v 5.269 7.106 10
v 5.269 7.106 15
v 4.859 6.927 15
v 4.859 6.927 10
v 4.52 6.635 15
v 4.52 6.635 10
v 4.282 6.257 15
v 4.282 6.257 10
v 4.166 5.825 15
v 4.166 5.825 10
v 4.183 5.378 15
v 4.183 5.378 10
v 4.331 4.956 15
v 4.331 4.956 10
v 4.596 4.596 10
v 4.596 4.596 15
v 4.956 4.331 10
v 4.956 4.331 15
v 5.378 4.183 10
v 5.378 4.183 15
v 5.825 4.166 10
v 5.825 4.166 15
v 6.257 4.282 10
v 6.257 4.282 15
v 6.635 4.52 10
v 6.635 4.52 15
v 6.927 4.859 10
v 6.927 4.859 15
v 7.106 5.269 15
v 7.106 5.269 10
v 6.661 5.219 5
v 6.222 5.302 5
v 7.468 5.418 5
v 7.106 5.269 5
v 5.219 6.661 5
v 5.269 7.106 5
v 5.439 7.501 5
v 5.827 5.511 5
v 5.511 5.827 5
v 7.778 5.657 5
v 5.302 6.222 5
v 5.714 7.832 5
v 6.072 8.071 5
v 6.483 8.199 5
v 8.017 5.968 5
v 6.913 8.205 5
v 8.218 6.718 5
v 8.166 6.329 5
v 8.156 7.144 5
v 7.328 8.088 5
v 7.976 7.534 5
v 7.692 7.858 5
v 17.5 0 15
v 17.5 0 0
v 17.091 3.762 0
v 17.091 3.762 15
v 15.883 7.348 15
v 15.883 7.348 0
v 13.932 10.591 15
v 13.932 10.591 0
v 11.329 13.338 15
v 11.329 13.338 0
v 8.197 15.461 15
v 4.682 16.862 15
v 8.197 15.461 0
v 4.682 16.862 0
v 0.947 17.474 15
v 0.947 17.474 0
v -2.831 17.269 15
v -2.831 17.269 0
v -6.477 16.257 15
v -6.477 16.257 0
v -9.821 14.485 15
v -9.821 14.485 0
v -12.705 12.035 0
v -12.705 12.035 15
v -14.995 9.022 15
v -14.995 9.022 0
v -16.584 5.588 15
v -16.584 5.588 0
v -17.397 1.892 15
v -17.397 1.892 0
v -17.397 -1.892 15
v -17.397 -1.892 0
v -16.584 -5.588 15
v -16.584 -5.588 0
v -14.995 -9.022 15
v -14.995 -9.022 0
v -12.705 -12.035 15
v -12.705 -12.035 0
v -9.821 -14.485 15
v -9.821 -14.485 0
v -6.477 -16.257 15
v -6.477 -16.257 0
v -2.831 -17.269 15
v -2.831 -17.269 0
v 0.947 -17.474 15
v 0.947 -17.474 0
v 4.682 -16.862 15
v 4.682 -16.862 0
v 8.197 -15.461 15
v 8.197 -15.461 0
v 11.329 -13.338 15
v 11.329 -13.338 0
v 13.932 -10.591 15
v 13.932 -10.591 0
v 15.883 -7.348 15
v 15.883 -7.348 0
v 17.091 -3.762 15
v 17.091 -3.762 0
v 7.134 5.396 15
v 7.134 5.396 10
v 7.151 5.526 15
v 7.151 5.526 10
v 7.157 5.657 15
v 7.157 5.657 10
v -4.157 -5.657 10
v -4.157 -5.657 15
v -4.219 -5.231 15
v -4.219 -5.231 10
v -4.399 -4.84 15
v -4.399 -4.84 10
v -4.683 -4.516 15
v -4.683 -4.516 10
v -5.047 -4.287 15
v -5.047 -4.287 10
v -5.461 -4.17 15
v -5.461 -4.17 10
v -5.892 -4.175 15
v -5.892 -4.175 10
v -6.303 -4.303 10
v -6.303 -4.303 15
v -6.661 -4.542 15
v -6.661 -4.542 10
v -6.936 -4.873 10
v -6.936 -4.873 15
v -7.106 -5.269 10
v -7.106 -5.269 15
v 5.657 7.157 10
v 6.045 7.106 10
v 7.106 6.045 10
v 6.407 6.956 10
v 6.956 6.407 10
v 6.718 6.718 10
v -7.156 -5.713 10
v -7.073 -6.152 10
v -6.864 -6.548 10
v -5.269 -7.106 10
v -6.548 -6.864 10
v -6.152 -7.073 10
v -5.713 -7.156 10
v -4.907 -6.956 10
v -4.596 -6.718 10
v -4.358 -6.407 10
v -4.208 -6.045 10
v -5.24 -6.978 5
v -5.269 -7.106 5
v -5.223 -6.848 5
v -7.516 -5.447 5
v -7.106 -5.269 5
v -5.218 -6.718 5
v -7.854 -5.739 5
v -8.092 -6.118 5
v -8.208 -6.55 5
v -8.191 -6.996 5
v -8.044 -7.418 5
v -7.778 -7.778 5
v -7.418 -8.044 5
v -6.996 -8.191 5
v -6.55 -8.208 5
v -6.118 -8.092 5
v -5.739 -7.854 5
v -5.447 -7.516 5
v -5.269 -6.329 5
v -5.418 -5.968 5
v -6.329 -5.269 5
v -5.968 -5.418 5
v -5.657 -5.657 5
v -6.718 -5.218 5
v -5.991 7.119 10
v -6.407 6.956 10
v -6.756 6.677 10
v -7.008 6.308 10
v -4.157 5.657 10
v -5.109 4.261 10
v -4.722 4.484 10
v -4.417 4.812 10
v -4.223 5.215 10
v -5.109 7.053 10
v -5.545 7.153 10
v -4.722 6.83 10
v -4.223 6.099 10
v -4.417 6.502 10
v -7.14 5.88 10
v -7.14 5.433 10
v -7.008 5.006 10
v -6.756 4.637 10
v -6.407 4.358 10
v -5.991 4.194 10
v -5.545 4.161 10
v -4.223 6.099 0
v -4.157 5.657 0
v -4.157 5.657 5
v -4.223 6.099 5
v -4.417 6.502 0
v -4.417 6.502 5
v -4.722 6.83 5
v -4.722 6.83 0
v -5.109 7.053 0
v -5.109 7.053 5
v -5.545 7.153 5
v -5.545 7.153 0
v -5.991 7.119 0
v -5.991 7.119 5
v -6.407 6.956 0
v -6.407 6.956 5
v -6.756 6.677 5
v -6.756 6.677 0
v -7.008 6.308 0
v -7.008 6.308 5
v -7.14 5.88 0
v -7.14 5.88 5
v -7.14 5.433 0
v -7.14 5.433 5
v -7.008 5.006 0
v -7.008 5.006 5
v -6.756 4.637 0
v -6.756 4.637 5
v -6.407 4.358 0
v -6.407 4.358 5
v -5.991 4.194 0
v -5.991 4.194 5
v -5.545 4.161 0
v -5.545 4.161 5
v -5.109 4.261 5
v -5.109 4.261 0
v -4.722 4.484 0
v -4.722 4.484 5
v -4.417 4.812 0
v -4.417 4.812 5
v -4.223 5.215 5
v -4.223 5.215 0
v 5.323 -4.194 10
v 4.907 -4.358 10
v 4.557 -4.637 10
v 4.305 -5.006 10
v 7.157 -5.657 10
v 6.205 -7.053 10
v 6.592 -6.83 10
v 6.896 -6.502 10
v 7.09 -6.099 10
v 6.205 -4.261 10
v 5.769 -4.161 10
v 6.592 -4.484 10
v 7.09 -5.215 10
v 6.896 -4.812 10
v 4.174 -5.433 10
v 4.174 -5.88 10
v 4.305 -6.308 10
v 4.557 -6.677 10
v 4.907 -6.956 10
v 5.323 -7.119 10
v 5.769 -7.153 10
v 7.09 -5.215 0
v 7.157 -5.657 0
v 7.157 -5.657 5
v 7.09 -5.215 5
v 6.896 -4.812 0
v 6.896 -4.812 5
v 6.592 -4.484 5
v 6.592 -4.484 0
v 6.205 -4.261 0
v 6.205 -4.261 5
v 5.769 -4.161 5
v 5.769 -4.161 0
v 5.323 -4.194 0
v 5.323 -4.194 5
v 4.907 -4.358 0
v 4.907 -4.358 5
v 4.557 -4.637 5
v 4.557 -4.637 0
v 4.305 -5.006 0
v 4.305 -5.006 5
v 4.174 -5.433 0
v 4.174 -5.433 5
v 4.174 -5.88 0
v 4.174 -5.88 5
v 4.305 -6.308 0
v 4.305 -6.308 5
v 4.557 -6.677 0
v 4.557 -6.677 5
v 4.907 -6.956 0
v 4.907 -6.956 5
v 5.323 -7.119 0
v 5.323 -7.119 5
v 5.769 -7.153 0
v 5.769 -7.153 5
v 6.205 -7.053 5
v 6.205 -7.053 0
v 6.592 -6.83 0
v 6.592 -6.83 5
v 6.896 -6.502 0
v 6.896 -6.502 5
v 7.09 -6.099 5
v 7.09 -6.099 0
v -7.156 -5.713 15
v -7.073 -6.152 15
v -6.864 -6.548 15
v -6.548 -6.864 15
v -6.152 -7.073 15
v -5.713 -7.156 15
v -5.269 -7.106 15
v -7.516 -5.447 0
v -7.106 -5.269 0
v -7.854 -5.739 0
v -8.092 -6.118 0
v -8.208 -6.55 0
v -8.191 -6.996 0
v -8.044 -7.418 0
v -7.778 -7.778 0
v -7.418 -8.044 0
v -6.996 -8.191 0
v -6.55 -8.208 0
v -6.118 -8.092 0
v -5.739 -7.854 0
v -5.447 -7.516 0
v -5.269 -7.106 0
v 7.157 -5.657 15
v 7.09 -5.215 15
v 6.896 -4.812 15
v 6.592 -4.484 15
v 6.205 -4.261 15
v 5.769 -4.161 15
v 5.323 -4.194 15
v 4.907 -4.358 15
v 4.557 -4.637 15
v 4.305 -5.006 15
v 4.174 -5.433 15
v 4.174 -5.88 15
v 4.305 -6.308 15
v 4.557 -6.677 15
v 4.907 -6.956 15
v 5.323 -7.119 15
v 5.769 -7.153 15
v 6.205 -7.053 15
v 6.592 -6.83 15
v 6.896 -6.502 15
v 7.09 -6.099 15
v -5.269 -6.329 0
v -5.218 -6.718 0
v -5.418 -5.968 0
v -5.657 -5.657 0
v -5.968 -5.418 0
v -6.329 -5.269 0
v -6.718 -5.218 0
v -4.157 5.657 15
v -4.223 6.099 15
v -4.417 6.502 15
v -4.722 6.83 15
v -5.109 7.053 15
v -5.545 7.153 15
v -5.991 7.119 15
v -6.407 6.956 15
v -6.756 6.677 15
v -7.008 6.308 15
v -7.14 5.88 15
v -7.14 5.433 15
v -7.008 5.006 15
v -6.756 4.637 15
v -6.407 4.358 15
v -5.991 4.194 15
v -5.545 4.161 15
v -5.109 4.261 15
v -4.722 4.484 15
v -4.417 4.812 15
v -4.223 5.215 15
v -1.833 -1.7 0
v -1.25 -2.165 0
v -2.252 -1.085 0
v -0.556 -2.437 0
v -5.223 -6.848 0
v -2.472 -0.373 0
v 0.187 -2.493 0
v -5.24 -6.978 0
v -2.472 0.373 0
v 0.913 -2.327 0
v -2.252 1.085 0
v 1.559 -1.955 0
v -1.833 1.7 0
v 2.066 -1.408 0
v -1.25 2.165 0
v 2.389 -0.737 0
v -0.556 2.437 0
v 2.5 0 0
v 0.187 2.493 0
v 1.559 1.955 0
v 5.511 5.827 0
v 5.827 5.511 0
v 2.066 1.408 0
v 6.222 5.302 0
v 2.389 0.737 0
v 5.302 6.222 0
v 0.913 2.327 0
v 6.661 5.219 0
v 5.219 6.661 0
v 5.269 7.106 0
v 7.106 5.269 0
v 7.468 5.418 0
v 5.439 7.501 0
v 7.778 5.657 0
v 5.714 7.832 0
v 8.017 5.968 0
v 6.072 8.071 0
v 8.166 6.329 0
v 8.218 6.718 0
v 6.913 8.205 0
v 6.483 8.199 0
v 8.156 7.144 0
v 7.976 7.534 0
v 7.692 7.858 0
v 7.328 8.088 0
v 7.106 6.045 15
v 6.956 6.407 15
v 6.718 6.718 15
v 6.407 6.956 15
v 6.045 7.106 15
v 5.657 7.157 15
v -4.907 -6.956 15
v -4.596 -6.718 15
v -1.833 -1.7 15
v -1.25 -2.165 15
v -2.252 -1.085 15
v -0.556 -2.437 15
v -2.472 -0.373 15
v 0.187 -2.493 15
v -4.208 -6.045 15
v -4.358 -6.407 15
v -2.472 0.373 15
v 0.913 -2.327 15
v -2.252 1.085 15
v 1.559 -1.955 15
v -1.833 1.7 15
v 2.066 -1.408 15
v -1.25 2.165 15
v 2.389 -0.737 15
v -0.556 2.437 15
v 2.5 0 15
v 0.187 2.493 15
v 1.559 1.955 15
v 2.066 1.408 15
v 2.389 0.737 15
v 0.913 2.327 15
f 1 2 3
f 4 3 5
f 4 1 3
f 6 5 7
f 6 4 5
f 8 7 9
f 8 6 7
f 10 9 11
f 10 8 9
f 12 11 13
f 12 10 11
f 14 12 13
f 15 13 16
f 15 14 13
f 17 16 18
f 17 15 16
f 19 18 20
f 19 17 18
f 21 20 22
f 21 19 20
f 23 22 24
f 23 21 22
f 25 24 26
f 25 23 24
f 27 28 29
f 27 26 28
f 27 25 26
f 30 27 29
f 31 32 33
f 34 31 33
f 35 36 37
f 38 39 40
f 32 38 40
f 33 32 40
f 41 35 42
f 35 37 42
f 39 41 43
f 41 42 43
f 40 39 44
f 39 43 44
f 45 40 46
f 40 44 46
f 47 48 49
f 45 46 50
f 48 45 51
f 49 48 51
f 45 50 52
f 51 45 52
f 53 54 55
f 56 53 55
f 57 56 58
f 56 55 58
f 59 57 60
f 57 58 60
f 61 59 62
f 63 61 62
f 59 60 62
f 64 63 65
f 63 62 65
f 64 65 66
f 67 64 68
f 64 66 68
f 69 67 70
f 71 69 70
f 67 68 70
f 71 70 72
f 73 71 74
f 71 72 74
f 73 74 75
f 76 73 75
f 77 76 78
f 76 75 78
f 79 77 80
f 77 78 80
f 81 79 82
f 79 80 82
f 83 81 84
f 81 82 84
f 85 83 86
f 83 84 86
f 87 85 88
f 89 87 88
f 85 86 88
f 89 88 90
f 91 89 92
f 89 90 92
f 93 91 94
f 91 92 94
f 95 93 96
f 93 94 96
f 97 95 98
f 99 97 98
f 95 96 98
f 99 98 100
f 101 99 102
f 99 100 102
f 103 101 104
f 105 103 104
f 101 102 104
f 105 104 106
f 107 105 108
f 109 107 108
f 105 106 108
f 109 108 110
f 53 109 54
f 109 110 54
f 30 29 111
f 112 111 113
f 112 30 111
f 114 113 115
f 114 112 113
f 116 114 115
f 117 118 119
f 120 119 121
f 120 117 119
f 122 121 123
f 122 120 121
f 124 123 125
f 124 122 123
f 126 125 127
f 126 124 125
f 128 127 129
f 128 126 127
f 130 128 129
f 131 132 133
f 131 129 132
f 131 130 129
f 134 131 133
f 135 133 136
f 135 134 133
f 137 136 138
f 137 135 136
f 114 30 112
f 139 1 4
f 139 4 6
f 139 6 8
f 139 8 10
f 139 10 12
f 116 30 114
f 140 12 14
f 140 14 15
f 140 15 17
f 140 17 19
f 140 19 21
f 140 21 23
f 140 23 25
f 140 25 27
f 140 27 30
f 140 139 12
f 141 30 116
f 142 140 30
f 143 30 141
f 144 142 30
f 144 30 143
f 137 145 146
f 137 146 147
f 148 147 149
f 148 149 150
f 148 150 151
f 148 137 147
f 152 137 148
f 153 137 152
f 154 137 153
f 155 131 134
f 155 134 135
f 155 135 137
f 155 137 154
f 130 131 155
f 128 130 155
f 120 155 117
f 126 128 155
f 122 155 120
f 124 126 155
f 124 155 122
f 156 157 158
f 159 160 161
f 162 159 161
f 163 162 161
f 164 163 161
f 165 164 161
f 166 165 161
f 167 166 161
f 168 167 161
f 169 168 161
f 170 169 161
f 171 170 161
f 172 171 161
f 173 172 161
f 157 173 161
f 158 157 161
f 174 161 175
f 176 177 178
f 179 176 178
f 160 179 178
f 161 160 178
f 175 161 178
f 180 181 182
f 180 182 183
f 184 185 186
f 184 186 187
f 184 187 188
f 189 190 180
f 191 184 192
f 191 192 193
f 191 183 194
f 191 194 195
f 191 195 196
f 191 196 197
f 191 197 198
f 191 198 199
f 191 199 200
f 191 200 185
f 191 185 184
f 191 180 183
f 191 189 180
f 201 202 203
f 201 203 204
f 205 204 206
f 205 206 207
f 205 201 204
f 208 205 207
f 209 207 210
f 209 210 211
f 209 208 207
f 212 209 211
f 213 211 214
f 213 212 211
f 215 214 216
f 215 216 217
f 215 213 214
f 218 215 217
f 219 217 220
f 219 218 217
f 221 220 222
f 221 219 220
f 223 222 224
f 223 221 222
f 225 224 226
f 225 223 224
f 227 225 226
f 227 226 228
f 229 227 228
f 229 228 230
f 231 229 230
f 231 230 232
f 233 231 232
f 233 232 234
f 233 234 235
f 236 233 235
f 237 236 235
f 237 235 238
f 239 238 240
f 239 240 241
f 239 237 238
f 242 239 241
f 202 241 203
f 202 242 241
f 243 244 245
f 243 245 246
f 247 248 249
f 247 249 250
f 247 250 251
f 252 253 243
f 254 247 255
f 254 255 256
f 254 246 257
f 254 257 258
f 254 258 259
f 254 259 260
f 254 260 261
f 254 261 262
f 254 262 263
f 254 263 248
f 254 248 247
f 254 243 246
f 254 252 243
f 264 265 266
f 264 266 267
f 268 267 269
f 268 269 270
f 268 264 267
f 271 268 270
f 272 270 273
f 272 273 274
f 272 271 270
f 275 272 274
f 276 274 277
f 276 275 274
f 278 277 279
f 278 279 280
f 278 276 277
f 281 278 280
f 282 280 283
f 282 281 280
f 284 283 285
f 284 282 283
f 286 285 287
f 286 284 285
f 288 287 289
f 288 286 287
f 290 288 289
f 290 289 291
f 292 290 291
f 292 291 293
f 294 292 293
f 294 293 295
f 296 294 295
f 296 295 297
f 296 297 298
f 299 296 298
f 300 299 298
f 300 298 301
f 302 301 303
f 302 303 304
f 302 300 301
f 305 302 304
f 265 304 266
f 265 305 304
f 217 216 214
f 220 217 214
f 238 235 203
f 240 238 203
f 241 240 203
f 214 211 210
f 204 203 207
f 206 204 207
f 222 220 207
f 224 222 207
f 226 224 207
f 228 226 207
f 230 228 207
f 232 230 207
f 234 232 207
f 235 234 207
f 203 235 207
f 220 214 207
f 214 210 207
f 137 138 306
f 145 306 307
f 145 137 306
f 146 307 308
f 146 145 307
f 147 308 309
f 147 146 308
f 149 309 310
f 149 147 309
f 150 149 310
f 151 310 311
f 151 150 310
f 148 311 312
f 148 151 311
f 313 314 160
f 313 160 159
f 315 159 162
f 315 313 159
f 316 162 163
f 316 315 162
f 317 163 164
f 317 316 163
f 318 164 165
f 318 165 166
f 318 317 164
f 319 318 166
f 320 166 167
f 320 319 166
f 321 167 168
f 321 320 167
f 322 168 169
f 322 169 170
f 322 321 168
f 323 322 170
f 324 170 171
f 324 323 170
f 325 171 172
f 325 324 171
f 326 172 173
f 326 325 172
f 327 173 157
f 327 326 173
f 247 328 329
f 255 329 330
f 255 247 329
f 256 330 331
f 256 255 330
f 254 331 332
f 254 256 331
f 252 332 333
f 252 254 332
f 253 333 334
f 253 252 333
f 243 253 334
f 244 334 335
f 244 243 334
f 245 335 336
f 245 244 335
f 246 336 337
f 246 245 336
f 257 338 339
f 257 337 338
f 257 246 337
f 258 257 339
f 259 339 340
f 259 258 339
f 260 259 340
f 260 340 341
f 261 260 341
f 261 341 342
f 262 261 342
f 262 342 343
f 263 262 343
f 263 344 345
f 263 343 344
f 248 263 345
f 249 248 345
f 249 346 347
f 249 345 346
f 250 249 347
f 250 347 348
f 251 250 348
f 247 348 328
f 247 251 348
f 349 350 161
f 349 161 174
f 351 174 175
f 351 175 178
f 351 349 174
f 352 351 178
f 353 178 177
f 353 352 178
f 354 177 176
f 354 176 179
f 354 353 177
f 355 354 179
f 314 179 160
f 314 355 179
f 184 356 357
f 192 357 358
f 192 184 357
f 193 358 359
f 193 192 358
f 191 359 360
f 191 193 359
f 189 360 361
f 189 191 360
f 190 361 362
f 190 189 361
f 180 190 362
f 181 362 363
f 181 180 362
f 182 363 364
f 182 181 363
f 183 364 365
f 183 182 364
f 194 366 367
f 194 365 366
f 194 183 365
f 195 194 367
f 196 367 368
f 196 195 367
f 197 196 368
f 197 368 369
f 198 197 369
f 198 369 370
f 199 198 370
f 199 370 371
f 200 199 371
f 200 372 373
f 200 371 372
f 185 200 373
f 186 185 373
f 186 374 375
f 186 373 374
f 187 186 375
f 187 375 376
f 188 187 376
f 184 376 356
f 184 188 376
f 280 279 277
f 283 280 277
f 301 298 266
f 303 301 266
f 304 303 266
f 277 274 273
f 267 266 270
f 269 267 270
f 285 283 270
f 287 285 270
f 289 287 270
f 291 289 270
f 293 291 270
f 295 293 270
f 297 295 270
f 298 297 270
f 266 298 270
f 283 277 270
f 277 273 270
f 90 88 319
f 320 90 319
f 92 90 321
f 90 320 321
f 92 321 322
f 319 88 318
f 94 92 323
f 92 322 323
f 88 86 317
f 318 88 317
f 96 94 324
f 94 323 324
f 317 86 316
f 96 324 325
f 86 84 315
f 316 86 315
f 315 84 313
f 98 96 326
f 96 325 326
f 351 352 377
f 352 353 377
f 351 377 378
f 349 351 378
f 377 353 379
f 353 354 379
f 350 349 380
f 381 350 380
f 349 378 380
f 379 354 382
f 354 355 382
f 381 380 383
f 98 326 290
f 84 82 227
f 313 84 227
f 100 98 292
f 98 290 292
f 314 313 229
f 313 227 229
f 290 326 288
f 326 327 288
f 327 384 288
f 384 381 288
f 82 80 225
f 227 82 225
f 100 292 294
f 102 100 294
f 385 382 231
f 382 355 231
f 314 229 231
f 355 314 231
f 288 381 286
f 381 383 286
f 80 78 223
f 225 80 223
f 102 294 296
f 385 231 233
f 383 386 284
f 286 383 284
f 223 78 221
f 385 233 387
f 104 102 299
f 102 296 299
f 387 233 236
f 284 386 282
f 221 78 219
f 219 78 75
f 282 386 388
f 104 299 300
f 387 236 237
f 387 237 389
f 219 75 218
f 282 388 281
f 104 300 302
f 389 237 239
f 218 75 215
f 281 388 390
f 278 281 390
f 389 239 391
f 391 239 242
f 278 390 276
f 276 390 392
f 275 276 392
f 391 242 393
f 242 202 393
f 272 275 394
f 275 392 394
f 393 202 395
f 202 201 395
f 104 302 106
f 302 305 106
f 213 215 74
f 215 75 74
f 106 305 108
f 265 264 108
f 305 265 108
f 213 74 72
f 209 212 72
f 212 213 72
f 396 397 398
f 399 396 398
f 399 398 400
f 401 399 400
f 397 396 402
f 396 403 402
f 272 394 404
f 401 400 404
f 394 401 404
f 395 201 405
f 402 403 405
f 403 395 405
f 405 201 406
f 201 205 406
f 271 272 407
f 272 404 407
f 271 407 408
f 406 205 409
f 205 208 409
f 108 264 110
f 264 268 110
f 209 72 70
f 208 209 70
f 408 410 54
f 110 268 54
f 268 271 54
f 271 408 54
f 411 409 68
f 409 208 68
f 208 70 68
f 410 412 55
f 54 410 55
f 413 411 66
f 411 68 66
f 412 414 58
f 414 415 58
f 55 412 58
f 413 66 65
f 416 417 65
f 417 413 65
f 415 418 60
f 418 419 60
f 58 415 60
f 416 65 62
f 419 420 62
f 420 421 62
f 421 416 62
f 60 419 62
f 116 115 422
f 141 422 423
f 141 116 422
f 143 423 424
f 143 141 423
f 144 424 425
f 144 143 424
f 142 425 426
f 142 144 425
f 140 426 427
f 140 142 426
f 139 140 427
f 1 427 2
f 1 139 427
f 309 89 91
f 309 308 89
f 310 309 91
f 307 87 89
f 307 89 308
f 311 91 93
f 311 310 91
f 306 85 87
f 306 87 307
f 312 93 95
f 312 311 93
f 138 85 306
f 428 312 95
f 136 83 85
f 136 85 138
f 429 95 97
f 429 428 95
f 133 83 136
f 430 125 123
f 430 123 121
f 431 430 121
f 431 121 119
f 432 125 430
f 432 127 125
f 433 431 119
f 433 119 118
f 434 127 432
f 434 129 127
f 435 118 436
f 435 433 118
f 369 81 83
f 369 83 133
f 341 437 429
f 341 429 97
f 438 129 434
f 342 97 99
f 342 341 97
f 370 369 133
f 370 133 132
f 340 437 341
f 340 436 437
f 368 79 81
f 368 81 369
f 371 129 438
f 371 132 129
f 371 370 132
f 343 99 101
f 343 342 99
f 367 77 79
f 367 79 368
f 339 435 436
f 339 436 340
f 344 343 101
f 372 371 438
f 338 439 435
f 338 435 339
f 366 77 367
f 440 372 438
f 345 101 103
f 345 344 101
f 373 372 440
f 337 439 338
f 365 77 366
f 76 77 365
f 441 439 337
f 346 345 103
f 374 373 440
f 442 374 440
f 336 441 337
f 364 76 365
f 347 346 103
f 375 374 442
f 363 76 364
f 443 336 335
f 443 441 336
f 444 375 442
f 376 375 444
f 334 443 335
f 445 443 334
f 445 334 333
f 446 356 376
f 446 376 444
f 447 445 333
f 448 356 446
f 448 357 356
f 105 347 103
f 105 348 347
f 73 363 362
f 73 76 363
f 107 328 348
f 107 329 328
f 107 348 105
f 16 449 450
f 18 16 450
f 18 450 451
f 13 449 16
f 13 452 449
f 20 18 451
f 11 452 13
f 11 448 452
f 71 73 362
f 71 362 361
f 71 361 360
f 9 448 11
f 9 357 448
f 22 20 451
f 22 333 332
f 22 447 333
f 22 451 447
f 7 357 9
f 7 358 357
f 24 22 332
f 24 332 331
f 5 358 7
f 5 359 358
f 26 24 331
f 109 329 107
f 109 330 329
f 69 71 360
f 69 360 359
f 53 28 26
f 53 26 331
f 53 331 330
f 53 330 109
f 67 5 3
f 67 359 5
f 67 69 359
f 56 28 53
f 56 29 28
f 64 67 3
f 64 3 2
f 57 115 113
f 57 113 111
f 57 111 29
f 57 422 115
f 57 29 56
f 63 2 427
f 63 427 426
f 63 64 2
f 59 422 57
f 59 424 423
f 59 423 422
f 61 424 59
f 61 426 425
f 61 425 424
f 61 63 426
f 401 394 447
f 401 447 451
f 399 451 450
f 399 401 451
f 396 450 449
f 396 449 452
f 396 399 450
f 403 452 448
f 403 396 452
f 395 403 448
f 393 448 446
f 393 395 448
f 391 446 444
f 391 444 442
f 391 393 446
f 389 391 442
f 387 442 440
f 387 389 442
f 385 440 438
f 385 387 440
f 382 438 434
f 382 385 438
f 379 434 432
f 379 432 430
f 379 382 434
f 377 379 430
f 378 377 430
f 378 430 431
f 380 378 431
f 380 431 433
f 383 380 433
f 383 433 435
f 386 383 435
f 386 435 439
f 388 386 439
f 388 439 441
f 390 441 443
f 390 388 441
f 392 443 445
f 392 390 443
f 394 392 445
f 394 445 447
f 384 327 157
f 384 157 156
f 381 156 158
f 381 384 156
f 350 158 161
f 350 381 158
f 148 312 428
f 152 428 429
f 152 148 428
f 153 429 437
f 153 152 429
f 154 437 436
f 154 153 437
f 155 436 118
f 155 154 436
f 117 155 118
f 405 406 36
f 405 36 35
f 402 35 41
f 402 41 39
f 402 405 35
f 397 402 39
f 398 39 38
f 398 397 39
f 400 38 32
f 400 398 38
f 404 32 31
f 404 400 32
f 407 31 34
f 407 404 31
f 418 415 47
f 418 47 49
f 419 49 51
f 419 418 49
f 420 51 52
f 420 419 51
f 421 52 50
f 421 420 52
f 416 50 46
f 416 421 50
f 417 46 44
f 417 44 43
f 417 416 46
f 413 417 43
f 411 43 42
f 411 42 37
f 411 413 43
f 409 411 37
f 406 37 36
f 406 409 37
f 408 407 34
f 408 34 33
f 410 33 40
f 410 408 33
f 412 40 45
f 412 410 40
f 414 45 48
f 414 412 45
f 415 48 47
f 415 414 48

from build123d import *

# Parameters (mm, degrees)
F0_R          = 17.5
F0_R_2        = 1.5
F0_R_3        = 2.5
F1_DEPTH      = 15
F2_START      = 10
F2_DEPTH      = 15
F3_DEPTH      = 5
F3_DEPTH_BACK = 2


with BuildPart() as f1:
    # F0 (on Top) → F1 (new body)
    with BuildSketch(Plane.XY):
        Circle(F0_R)
        with BuildLine():
            ThreePointArc((-7.1057429889, -5.2686256818), (-5.4610649612, -4.1696869574), (-4.1568542495, -5.6568542495))
            ThreePointArc((-4.1568542495, -5.6568542495), (-4.4668242391, -6.569996393), (-5.2686256818, -7.1057429889))
            ThreePointArc((-5.2686256818, -7.1057429889), (-7.7781745931, -7.7781745931), (-7.1057429889, -5.2686256818))
        make_face(mode=Mode.SUBTRACT)
        with Locations((5.6568542495, -5.6568542495)):
            Circle(F0_R_2, mode=Mode.SUBTRACT)
        with Locations((-5.6568542495, 5.6568542495)):
            Circle(F0_R_2, mode=Mode.SUBTRACT)
        Circle(F0_R_3, mode=Mode.SUBTRACT)
        with BuildLine():
            ThreePointArc((7.1057429889, 5.2686256818), (4.5961940777, 4.5961940777), (5.2686256818, 7.1057429889))
            ThreePointArc((5.2686256818, 7.1057429889), (6.9133037096, 8.2046817133), (8.2175144213, 6.7175144213))
            ThreePointArc((8.2175144213, 6.7175144213), (7.9075444317, 5.8043722778), (7.1057429889, 5.2686256818))
        make_face(mode=Mode.SUBTRACT)
        with Locations((-5.6568542495, 5.6568542495)):
            Circle(F0_R_2)
        with BuildLine():
            ThreePointArc((-5.2686256818, -7.1057429889), (-6.7175144213, -6.7175144213), (-7.1057429889, -5.2686256818))
            ThreePointArc((-7.1057429889, -5.2686256818), (-7.7781745931, -7.7781745931), (-5.2686256818, -7.1057429889))
        make_face()
        with BuildLine():
            ThreePointArc((-5.2175144213, -6.7175144213), (-5.8043722778, -5.5274844108), (-7.1057429889, -5.2686256818))
            ThreePointArc((-7.1057429889, -5.2686256818), (-6.7175144213, -6.7175144213), (-5.2686256818, -7.1057429889))
            ThreePointArc((-5.2686256818, -7.1057429889), (-5.2303471292, -6.9133037096), (-5.2175144213, -6.7175144213))
        make_face()
        with BuildLine():
            ThreePointArc((-5.2686256818, -7.1057429889), (-4.4668242391, -6.569996393), (-4.1568542495, -5.6568542495))
            ThreePointArc((-4.1568542495, -5.6568542495), (-5.4610649612, -4.1696869574), (-7.1057429889, -5.2686256818))
            ThreePointArc((-7.1057429889, -5.2686256818), (-5.8043722778, -5.5274844108), (-5.2175144213, -6.7175144213))
            ThreePointArc((-5.2175144213, -6.7175144213), (-5.2303471292, -6.9133037096), (-5.2686256818, -7.1057429889))
        make_face()
        with Locations((5.6568542495, -5.6568542495)):
            Circle(F0_R_2)
        with BuildLine():
            ThreePointArc((7.1057429889, 5.2686256818), (5.6568542495, 5.6568542495), (5.2686256818, 7.1057429889))
            ThreePointArc((5.2686256818, 7.1057429889), (4.5961940777, 4.5961940777), (7.1057429889, 5.2686256818))
        make_face()
        with BuildLine():
            ThreePointArc((7.1057429889, 5.2686256818), (7.1440215416, 5.4610649612), (7.1568542495, 5.6568542495))
            ThreePointArc((7.1568542495, 5.6568542495), (6.569996393, 6.8468842599), (5.2686256818, 7.1057429889))
            ThreePointArc((5.2686256818, 7.1057429889), (5.6568542495, 5.6568542495), (7.1057429889, 5.2686256818))
        make_face()
        with BuildLine():
            ThreePointArc((5.2686256818, 7.1057429889), (6.569996393, 6.8468842599), (7.1568542495, 5.6568542495))
            ThreePointArc((7.1568542495, 5.6568542495), (7.1440215416, 5.4610649612), (7.1057429889, 5.2686256818))
            ThreePointArc((7.1057429889, 5.2686256818), (7.9075444317, 5.8043722778), (8.2175144213, 6.7175144213))
            ThreePointArc((8.2175144213, 6.7175144213), (6.9133037096, 8.2046817133), (5.2686256818, 7.1057429889))
        make_face()
    extrude(amount=F1_DEPTH)

    # F0 (on Top) → F2 (cut)
    with BuildSketch(Plane.XY.offset(F2_START)):
        with Locations((-5.6568542495, 5.6568542495)):
            Circle(F0_R_2)
        with BuildLine():
            ThreePointArc((7.1057429889, 5.2686256818), (5.6568542495, 5.6568542495), (5.2686256818, 7.1057429889))
            ThreePointArc((5.2686256818, 7.1057429889), (4.5961940777, 4.5961940777), (7.1057429889, 5.2686256818))
        make_face()
        with BuildLine():
            ThreePointArc((7.1057429889, 5.2686256818), (7.1440215416, 5.4610649612), (7.1568542495, 5.6568542495))
            ThreePointArc((7.1568542495, 5.6568542495), (6.569996393, 6.8468842599), (5.2686256818, 7.1057429889))
            ThreePointArc((5.2686256818, 7.1057429889), (5.6568542495, 5.6568542495), (7.1057429889, 5.2686256818))
        make_face()
        with Locations((5.6568542495, -5.6568542495)):
            Circle(F0_R_2)
        with BuildLine():
            ThreePointArc((-5.2686256818, -7.1057429889), (-4.4668242391, -6.569996393), (-4.1568542495, -5.6568542495))
            ThreePointArc((-4.1568542495, -5.6568542495), (-5.4610649612, -4.1696869574), (-7.1057429889, -5.2686256818))
            ThreePointArc((-7.1057429889, -5.2686256818), (-5.8043722778, -5.5274844108), (-5.2175144213, -6.7175144213))
            ThreePointArc((-5.2175144213, -6.7175144213), (-5.2303471292, -6.9133037096), (-5.2686256818, -7.1057429889))
        make_face()
        with BuildLine():
            ThreePointArc((-5.2175144213, -6.7175144213), (-5.8043722778, -5.5274844108), (-7.1057429889, -5.2686256818))
            ThreePointArc((-7.1057429889, -5.2686256818), (-6.7175144213, -6.7175144213), (-5.2686256818, -7.1057429889))
            ThreePointArc((-5.2686256818, -7.1057429889), (-5.2303471292, -6.9133037096), (-5.2175144213, -6.7175144213))
        make_face()
    extrude(amount=F2_DEPTH, mode=Mode.SUBTRACT)

    # F0 (on Top) → F3 (cut, two sides)
    with BuildSketch(Plane.XY) as f3_sk:
        with Locations((-5.6568542495, 5.6568542495)):
            Circle(F0_R_2)
        with Locations((5.6568542495, -5.6568542495)):
            Circle(F0_R_2)
        with BuildLine():
            ThreePointArc((-5.2686256818, -7.1057429889), (-6.7175144213, -6.7175144213), (-7.1057429889, -5.2686256818))
            ThreePointArc((-7.1057429889, -5.2686256818), (-7.7781745931, -7.7781745931), (-5.2686256818, -7.1057429889))
        make_face()
        with BuildLine():
            ThreePointArc((-5.2175144213, -6.7175144213), (-5.8043722778, -5.5274844108), (-7.1057429889, -5.2686256818))
            ThreePointArc((-7.1057429889, -5.2686256818), (-6.7175144213, -6.7175144213), (-5.2686256818, -7.1057429889))
            ThreePointArc((-5.2686256818, -7.1057429889), (-5.2303471292, -6.9133037096), (-5.2175144213, -6.7175144213))
        make_face()
        with BuildLine():
            ThreePointArc((5.2686256818, 7.1057429889), (6.569996393, 6.8468842599), (7.1568542495, 5.6568542495))
            ThreePointArc((7.1568542495, 5.6568542495), (7.1440215416, 5.4610649612), (7.1057429889, 5.2686256818))
            ThreePointArc((7.1057429889, 5.2686256818), (7.9075444317, 5.8043722778), (8.2175144213, 6.7175144213))
            ThreePointArc((8.2175144213, 6.7175144213), (6.9133037096, 8.2046817133), (5.2686256818, 7.1057429889))
        make_face()
        with BuildLine():
            ThreePointArc((7.1057429889, 5.2686256818), (7.1440215416, 5.4610649612), (7.1568542495, 5.6568542495))
            ThreePointArc((7.1568542495, 5.6568542495), (6.569996393, 6.8468842599), (5.2686256818, 7.1057429889))
            ThreePointArc((5.2686256818, 7.1057429889), (5.6568542495, 5.6568542495), (7.1057429889, 5.2686256818))
        make_face()
    extrude(amount=F3_DEPTH, mode=Mode.SUBTRACT)
    extrude(f3_sk.sketch, amount=-F3_DEPTH_BACK, mode=Mode.SUBTRACT)


solid = f1.part
